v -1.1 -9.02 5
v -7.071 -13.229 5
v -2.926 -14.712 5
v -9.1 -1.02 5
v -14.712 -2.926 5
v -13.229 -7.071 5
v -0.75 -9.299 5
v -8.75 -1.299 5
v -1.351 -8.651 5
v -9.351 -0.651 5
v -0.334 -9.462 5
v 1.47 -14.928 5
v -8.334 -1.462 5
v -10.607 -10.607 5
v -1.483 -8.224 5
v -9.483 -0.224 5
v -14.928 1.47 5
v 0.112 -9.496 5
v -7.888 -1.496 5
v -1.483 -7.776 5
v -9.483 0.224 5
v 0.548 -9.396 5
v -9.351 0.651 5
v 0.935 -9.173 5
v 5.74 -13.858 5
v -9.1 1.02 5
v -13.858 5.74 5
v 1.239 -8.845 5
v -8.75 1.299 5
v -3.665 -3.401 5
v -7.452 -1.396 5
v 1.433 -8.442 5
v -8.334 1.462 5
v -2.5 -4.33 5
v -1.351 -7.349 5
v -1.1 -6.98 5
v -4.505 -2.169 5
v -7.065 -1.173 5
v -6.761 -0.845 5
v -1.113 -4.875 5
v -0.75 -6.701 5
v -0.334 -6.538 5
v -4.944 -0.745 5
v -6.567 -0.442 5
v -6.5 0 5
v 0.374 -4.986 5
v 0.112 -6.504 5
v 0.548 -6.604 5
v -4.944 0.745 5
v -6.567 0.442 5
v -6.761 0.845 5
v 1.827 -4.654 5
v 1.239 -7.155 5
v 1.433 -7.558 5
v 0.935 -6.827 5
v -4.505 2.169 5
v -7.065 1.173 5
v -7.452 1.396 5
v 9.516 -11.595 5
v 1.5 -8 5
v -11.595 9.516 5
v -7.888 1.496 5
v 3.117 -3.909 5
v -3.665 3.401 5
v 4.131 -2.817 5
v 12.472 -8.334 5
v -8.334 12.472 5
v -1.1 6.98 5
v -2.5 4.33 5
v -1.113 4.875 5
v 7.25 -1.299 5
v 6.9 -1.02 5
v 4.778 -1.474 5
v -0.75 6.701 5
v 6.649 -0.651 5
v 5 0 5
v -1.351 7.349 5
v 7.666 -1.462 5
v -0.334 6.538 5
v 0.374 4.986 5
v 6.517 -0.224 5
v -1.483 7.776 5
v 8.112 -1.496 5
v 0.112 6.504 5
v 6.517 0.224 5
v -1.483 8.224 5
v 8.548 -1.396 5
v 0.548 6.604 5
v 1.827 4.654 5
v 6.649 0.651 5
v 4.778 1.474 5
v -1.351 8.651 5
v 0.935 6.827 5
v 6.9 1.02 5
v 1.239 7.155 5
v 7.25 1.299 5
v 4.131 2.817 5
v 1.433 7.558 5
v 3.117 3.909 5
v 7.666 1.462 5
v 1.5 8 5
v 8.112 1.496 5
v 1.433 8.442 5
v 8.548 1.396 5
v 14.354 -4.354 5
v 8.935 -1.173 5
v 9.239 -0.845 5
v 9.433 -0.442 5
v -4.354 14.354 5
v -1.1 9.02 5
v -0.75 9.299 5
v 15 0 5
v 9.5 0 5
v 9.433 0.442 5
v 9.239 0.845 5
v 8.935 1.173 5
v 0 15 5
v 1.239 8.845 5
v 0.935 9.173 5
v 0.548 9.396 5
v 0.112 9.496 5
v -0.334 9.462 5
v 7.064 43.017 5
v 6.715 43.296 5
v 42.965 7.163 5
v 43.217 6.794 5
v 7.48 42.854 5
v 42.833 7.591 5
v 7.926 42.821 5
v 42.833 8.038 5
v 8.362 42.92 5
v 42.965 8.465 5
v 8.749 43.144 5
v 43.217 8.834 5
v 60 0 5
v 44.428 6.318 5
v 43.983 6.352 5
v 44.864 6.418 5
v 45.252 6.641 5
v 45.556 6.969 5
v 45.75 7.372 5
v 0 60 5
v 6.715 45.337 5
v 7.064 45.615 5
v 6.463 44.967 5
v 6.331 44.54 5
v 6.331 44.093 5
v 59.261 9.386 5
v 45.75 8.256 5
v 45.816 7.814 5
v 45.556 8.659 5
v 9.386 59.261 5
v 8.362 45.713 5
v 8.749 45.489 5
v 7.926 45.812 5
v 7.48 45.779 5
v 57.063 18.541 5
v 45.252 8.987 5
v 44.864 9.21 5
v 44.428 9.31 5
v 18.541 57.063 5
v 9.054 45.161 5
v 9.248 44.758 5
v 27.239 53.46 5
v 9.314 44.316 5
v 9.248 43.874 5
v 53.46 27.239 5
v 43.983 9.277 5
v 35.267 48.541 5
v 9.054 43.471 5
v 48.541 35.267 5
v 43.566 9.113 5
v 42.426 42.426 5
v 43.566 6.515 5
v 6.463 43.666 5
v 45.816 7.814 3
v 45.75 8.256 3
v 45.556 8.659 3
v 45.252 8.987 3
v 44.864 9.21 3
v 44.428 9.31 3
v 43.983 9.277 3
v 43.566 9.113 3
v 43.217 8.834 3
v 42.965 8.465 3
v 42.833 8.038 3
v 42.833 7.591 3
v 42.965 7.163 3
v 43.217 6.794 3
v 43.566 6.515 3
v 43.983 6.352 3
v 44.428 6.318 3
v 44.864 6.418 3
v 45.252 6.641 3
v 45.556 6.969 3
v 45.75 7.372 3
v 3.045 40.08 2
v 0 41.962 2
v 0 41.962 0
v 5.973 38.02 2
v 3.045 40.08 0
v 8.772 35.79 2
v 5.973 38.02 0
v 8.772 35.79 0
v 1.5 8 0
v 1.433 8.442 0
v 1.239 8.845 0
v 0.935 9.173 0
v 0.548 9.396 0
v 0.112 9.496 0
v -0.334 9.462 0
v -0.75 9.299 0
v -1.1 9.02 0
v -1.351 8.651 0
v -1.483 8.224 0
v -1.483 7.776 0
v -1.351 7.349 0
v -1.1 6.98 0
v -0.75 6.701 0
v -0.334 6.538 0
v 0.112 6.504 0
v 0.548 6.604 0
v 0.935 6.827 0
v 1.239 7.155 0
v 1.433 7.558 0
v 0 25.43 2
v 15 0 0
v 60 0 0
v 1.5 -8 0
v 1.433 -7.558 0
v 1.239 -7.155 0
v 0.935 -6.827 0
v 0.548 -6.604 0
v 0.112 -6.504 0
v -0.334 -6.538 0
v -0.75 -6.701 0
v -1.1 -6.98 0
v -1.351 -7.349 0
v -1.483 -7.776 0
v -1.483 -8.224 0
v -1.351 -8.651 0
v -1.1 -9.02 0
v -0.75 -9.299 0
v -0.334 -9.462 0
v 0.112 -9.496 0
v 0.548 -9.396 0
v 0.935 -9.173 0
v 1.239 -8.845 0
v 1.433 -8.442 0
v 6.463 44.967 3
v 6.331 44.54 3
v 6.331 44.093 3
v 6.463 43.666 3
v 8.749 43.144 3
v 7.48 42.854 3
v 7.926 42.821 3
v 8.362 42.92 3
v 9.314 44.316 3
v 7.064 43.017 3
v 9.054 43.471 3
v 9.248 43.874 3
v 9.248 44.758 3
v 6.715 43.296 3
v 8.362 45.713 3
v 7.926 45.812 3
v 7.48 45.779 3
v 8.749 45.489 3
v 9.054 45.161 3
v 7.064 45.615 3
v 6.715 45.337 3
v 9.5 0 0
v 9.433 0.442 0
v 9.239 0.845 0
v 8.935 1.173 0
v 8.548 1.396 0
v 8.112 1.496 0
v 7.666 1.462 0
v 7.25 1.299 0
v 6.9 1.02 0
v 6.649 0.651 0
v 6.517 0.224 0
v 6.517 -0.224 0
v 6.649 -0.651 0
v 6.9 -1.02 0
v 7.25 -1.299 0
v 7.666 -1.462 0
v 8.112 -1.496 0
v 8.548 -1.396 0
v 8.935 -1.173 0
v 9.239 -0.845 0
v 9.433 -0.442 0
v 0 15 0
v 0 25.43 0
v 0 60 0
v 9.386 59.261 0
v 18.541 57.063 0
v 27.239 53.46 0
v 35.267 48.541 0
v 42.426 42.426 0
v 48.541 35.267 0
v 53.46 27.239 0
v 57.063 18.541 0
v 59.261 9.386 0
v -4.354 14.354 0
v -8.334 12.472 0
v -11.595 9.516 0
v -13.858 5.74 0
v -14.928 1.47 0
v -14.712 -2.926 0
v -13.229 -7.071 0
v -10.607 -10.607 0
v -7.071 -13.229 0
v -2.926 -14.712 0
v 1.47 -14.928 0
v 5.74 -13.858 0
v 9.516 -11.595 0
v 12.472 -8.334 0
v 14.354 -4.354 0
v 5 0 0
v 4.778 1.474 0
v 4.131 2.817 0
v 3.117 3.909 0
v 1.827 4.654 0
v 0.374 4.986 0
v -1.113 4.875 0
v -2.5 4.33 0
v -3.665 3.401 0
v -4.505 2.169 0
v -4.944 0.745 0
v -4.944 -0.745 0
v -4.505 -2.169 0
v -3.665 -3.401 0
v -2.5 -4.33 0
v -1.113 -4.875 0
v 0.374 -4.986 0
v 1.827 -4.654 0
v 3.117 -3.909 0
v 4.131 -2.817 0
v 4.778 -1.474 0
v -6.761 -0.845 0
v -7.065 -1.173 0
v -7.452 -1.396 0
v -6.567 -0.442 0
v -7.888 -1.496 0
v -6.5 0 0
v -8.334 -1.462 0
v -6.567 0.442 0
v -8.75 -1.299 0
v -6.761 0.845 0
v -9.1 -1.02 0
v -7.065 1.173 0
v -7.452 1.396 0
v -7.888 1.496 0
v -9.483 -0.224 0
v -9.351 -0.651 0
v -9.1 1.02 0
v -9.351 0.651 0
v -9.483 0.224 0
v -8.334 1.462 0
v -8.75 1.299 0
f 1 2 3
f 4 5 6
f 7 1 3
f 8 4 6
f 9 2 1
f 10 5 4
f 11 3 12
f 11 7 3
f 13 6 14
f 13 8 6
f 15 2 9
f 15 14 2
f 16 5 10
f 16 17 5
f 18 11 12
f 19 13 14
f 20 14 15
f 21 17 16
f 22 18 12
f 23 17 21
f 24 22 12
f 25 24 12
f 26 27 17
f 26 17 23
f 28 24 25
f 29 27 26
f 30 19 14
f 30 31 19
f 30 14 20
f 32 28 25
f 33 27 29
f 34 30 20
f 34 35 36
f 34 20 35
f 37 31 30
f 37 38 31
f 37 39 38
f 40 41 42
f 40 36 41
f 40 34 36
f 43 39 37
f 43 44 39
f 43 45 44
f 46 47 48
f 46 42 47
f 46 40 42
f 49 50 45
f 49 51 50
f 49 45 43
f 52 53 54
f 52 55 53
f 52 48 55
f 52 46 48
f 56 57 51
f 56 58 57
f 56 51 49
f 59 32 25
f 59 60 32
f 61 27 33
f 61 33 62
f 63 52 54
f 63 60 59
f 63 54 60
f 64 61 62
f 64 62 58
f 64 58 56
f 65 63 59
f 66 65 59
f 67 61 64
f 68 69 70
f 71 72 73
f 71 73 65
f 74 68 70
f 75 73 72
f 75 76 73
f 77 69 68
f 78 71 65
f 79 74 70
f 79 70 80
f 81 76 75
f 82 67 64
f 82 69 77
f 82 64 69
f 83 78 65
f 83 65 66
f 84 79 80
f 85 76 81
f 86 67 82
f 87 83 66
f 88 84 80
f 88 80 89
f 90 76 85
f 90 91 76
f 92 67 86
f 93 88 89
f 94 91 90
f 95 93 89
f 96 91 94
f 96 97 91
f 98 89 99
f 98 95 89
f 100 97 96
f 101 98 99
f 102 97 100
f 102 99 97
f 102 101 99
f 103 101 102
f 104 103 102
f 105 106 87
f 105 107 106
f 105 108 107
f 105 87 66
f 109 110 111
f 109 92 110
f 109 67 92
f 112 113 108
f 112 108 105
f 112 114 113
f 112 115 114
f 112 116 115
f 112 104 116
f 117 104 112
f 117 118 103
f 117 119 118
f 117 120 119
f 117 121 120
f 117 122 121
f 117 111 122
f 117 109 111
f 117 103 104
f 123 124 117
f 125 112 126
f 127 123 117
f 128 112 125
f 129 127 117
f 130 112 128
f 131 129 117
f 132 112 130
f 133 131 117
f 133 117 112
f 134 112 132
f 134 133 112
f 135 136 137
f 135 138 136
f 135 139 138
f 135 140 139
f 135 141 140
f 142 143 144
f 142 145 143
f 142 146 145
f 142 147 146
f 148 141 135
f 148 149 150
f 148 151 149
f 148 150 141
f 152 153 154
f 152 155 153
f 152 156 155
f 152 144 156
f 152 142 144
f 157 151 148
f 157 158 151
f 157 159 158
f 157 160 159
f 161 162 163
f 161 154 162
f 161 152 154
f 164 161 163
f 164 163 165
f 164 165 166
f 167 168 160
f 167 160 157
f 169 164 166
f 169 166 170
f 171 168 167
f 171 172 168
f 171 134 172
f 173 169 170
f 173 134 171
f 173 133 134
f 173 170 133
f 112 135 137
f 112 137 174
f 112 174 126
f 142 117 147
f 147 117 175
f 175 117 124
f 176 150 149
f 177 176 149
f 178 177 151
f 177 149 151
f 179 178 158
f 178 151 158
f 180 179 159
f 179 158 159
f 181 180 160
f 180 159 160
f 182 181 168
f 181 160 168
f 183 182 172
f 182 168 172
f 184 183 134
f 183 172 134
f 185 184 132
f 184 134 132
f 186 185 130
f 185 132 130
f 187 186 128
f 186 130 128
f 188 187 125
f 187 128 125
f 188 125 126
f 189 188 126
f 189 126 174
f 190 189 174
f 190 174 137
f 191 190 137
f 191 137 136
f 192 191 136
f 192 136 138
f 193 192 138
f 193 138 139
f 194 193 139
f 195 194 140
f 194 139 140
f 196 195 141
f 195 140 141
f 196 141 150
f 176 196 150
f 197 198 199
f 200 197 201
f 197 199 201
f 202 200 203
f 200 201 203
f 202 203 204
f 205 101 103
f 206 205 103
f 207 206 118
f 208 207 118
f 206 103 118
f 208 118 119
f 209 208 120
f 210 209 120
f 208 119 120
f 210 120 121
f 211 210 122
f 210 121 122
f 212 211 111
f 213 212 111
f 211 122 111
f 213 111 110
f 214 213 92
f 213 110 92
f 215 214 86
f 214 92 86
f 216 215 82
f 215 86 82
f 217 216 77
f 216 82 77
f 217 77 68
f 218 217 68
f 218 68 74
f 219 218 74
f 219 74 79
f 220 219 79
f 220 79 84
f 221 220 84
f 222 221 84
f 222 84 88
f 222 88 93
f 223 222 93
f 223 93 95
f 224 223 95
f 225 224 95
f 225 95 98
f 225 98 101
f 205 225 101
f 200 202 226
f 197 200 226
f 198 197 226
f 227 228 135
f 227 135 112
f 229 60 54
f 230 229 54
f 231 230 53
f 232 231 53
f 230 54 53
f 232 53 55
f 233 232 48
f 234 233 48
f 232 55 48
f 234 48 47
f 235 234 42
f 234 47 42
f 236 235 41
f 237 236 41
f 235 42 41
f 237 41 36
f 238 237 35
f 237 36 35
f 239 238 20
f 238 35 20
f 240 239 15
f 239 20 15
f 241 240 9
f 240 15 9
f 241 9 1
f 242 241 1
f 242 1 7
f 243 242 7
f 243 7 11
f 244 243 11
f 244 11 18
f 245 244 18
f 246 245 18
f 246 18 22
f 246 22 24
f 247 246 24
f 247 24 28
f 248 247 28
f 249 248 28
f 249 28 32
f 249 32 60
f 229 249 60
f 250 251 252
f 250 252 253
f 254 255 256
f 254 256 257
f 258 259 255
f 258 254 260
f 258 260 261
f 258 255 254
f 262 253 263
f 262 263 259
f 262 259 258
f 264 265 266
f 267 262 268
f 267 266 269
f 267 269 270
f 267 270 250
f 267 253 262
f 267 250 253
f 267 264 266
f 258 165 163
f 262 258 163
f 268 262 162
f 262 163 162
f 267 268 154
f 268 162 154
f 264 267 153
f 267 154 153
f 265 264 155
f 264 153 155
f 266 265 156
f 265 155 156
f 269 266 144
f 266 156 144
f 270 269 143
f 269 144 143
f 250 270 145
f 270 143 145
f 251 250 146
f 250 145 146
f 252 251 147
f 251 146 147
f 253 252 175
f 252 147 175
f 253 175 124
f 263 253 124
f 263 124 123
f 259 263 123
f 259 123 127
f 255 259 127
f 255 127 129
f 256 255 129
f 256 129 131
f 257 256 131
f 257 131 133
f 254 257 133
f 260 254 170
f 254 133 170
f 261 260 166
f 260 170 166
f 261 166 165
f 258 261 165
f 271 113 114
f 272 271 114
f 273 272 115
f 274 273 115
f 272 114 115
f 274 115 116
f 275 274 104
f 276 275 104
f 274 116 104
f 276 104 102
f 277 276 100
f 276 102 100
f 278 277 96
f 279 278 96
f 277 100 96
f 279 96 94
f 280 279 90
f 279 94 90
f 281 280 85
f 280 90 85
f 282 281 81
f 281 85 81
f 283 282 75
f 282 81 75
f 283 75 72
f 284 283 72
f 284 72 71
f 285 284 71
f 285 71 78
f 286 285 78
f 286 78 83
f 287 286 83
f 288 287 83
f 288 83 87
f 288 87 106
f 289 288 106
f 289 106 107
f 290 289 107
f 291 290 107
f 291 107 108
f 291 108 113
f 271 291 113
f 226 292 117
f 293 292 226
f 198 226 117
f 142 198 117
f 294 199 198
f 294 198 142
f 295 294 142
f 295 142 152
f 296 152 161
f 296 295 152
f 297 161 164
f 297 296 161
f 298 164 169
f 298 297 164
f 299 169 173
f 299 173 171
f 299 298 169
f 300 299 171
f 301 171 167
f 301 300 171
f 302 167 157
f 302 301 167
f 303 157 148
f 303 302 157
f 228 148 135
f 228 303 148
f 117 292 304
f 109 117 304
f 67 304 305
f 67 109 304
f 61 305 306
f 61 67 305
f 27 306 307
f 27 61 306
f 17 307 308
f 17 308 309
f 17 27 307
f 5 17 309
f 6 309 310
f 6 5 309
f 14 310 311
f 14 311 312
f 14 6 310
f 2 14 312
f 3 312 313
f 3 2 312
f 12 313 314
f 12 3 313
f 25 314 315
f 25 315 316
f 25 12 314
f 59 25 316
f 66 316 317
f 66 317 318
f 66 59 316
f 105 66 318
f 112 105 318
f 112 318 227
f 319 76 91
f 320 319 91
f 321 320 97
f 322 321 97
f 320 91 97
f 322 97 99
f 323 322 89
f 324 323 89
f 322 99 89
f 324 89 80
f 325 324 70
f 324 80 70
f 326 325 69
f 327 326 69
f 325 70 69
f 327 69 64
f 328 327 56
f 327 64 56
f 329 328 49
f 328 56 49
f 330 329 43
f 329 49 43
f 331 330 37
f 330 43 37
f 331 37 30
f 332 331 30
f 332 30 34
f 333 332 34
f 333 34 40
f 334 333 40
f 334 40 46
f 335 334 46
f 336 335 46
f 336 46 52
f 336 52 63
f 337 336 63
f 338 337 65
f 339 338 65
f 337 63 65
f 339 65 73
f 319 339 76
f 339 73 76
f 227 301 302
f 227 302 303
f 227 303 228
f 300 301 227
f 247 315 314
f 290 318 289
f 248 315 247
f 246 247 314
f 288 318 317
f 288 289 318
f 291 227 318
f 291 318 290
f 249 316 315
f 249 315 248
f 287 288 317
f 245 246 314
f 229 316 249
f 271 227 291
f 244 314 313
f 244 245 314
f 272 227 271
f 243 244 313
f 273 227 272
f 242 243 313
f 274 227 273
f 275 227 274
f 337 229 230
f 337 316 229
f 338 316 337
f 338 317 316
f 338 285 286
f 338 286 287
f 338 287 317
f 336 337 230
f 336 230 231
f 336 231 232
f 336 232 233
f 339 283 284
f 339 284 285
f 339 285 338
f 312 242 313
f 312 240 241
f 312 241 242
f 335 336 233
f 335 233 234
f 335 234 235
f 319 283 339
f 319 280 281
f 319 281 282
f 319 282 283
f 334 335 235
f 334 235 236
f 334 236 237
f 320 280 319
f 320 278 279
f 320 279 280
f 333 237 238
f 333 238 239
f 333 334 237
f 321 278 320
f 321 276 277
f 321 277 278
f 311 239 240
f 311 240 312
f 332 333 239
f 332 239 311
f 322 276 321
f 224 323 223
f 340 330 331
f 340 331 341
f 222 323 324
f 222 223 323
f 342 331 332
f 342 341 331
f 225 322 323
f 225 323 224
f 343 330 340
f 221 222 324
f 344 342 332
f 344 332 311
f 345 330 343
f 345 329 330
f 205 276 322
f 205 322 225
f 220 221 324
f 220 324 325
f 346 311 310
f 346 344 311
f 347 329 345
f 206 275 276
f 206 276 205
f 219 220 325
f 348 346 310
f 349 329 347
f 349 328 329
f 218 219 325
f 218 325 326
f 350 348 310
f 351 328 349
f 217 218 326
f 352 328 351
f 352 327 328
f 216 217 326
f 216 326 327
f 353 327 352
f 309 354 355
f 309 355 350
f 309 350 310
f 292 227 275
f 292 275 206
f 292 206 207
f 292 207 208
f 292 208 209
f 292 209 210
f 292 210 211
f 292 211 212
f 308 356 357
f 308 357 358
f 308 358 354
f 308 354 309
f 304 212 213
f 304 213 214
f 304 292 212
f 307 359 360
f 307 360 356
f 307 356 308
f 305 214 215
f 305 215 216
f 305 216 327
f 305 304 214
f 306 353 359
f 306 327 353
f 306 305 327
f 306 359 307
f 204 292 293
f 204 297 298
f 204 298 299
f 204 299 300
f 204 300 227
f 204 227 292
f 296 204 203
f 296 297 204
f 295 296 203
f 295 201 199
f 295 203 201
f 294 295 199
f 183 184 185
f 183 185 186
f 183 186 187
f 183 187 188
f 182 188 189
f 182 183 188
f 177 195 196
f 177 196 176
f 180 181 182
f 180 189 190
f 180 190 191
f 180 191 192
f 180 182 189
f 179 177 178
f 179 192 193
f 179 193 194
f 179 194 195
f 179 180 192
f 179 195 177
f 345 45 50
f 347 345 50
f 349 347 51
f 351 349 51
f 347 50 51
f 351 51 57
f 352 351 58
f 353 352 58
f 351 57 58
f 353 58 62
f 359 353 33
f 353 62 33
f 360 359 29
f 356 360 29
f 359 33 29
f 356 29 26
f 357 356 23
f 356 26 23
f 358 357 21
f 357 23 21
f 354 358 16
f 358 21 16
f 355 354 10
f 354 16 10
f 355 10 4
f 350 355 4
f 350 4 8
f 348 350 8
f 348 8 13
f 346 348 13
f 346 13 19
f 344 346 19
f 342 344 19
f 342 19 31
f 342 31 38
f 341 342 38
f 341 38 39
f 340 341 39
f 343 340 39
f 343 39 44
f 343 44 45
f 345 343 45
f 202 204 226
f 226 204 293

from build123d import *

# Parameters (mm, degrees)
BOSS_EXTRUDE1_DEPTH = 5
SKETCH2_R           = 15
BOSS_EXTRUDE2_DEPTH = 5
SKETCH3_R           = 5
CUT_EXTRUDE1_DEPTH  = 5
SKETCH4_R           = 1.5
CUT_EXTRUDE2_DEPTH  = 2
CUT_EXTRUDE3_DEPTH  = 2
SKETCH6_R           = 1.5
CUT_EXTRUDE4_DEPTH  = 10


with BuildPart() as part:
    # Sketch1 → Boss-Extrude1 (new body)
    with BuildSketch(Plane.XY):
        with BuildLine():
            Line((0, 0), (0, 60))
            ThreePointArc((0, 60), (42.426406871, 42.426406871), (60, 0))
            Line((60, 0), (0, 0))
        make_face()
    extrude(amount=BOSS_EXTRUDE1_DEPTH)

    # Sketch2 → Boss-Extrude2 (add)
    with BuildSketch(Plane.XY.offset(5)):
        Circle(SKETCH2_R)
    extrude(amount=-BOSS_EXTRUDE2_DEPTH)

    # Sketch3 → Cut-Extrude1 (cut)
    with BuildSketch(Plane.XY.offset(5)):
        Circle(SKETCH3_R)
    extrude(amount=-CUT_EXTRUDE1_DEPTH, mode=Mode.SUBTRACT)

    # Sketch4 → Cut-Extrude2 (cut)
    with BuildSketch(Plane.XY.offset(5)):
        with Locations((7.814167995, 44.316348886)):
            Circle(SKETCH4_R)
        with Locations((44.316348886, 7.814167995)):
            Circle(SKETCH4_R)
    extrude(amount=-CUT_EXTRUDE2_DEPTH, mode=Mode.SUBTRACT)

    # Sketch5 → Cut-Extrude3 (cut)
    with BuildSketch(Plane.XY):
        with BuildLine():
            Line((8.772167152, 35.789944904), (-0.110326549, 25.299716292))
            Line((-0.110326549, 25.299716292), (-0.035812461, 41.982184113))
            ThreePointArc((-0.035812461, 41.982184113), (4.507355312, 39.084034363), (8.772167152, 35.789944904))
        make_face()
    extrude(amount=CUT_EXTRUDE3_DEPTH, mode=Mode.SUBTRACT)

    # Sketch6 → Cut-Extrude4 (cut)
    with BuildSketch(Plane.XY.offset(5)):
        with Locations((0, 8)):
            Circle(SKETCH6_R)
        with Locations((8, 0)):
            Circle(SKETCH6_R)
        with Locations((0, -8)):
            Circle(SKETCH6_R)
        with Locations((-8, 0)):
            Circle(SKETCH6_R)
    extrude(amount=-CUT_EXTRUDE4_DEPTH, mode=Mode.SUBTRACT)


solid = part.part
